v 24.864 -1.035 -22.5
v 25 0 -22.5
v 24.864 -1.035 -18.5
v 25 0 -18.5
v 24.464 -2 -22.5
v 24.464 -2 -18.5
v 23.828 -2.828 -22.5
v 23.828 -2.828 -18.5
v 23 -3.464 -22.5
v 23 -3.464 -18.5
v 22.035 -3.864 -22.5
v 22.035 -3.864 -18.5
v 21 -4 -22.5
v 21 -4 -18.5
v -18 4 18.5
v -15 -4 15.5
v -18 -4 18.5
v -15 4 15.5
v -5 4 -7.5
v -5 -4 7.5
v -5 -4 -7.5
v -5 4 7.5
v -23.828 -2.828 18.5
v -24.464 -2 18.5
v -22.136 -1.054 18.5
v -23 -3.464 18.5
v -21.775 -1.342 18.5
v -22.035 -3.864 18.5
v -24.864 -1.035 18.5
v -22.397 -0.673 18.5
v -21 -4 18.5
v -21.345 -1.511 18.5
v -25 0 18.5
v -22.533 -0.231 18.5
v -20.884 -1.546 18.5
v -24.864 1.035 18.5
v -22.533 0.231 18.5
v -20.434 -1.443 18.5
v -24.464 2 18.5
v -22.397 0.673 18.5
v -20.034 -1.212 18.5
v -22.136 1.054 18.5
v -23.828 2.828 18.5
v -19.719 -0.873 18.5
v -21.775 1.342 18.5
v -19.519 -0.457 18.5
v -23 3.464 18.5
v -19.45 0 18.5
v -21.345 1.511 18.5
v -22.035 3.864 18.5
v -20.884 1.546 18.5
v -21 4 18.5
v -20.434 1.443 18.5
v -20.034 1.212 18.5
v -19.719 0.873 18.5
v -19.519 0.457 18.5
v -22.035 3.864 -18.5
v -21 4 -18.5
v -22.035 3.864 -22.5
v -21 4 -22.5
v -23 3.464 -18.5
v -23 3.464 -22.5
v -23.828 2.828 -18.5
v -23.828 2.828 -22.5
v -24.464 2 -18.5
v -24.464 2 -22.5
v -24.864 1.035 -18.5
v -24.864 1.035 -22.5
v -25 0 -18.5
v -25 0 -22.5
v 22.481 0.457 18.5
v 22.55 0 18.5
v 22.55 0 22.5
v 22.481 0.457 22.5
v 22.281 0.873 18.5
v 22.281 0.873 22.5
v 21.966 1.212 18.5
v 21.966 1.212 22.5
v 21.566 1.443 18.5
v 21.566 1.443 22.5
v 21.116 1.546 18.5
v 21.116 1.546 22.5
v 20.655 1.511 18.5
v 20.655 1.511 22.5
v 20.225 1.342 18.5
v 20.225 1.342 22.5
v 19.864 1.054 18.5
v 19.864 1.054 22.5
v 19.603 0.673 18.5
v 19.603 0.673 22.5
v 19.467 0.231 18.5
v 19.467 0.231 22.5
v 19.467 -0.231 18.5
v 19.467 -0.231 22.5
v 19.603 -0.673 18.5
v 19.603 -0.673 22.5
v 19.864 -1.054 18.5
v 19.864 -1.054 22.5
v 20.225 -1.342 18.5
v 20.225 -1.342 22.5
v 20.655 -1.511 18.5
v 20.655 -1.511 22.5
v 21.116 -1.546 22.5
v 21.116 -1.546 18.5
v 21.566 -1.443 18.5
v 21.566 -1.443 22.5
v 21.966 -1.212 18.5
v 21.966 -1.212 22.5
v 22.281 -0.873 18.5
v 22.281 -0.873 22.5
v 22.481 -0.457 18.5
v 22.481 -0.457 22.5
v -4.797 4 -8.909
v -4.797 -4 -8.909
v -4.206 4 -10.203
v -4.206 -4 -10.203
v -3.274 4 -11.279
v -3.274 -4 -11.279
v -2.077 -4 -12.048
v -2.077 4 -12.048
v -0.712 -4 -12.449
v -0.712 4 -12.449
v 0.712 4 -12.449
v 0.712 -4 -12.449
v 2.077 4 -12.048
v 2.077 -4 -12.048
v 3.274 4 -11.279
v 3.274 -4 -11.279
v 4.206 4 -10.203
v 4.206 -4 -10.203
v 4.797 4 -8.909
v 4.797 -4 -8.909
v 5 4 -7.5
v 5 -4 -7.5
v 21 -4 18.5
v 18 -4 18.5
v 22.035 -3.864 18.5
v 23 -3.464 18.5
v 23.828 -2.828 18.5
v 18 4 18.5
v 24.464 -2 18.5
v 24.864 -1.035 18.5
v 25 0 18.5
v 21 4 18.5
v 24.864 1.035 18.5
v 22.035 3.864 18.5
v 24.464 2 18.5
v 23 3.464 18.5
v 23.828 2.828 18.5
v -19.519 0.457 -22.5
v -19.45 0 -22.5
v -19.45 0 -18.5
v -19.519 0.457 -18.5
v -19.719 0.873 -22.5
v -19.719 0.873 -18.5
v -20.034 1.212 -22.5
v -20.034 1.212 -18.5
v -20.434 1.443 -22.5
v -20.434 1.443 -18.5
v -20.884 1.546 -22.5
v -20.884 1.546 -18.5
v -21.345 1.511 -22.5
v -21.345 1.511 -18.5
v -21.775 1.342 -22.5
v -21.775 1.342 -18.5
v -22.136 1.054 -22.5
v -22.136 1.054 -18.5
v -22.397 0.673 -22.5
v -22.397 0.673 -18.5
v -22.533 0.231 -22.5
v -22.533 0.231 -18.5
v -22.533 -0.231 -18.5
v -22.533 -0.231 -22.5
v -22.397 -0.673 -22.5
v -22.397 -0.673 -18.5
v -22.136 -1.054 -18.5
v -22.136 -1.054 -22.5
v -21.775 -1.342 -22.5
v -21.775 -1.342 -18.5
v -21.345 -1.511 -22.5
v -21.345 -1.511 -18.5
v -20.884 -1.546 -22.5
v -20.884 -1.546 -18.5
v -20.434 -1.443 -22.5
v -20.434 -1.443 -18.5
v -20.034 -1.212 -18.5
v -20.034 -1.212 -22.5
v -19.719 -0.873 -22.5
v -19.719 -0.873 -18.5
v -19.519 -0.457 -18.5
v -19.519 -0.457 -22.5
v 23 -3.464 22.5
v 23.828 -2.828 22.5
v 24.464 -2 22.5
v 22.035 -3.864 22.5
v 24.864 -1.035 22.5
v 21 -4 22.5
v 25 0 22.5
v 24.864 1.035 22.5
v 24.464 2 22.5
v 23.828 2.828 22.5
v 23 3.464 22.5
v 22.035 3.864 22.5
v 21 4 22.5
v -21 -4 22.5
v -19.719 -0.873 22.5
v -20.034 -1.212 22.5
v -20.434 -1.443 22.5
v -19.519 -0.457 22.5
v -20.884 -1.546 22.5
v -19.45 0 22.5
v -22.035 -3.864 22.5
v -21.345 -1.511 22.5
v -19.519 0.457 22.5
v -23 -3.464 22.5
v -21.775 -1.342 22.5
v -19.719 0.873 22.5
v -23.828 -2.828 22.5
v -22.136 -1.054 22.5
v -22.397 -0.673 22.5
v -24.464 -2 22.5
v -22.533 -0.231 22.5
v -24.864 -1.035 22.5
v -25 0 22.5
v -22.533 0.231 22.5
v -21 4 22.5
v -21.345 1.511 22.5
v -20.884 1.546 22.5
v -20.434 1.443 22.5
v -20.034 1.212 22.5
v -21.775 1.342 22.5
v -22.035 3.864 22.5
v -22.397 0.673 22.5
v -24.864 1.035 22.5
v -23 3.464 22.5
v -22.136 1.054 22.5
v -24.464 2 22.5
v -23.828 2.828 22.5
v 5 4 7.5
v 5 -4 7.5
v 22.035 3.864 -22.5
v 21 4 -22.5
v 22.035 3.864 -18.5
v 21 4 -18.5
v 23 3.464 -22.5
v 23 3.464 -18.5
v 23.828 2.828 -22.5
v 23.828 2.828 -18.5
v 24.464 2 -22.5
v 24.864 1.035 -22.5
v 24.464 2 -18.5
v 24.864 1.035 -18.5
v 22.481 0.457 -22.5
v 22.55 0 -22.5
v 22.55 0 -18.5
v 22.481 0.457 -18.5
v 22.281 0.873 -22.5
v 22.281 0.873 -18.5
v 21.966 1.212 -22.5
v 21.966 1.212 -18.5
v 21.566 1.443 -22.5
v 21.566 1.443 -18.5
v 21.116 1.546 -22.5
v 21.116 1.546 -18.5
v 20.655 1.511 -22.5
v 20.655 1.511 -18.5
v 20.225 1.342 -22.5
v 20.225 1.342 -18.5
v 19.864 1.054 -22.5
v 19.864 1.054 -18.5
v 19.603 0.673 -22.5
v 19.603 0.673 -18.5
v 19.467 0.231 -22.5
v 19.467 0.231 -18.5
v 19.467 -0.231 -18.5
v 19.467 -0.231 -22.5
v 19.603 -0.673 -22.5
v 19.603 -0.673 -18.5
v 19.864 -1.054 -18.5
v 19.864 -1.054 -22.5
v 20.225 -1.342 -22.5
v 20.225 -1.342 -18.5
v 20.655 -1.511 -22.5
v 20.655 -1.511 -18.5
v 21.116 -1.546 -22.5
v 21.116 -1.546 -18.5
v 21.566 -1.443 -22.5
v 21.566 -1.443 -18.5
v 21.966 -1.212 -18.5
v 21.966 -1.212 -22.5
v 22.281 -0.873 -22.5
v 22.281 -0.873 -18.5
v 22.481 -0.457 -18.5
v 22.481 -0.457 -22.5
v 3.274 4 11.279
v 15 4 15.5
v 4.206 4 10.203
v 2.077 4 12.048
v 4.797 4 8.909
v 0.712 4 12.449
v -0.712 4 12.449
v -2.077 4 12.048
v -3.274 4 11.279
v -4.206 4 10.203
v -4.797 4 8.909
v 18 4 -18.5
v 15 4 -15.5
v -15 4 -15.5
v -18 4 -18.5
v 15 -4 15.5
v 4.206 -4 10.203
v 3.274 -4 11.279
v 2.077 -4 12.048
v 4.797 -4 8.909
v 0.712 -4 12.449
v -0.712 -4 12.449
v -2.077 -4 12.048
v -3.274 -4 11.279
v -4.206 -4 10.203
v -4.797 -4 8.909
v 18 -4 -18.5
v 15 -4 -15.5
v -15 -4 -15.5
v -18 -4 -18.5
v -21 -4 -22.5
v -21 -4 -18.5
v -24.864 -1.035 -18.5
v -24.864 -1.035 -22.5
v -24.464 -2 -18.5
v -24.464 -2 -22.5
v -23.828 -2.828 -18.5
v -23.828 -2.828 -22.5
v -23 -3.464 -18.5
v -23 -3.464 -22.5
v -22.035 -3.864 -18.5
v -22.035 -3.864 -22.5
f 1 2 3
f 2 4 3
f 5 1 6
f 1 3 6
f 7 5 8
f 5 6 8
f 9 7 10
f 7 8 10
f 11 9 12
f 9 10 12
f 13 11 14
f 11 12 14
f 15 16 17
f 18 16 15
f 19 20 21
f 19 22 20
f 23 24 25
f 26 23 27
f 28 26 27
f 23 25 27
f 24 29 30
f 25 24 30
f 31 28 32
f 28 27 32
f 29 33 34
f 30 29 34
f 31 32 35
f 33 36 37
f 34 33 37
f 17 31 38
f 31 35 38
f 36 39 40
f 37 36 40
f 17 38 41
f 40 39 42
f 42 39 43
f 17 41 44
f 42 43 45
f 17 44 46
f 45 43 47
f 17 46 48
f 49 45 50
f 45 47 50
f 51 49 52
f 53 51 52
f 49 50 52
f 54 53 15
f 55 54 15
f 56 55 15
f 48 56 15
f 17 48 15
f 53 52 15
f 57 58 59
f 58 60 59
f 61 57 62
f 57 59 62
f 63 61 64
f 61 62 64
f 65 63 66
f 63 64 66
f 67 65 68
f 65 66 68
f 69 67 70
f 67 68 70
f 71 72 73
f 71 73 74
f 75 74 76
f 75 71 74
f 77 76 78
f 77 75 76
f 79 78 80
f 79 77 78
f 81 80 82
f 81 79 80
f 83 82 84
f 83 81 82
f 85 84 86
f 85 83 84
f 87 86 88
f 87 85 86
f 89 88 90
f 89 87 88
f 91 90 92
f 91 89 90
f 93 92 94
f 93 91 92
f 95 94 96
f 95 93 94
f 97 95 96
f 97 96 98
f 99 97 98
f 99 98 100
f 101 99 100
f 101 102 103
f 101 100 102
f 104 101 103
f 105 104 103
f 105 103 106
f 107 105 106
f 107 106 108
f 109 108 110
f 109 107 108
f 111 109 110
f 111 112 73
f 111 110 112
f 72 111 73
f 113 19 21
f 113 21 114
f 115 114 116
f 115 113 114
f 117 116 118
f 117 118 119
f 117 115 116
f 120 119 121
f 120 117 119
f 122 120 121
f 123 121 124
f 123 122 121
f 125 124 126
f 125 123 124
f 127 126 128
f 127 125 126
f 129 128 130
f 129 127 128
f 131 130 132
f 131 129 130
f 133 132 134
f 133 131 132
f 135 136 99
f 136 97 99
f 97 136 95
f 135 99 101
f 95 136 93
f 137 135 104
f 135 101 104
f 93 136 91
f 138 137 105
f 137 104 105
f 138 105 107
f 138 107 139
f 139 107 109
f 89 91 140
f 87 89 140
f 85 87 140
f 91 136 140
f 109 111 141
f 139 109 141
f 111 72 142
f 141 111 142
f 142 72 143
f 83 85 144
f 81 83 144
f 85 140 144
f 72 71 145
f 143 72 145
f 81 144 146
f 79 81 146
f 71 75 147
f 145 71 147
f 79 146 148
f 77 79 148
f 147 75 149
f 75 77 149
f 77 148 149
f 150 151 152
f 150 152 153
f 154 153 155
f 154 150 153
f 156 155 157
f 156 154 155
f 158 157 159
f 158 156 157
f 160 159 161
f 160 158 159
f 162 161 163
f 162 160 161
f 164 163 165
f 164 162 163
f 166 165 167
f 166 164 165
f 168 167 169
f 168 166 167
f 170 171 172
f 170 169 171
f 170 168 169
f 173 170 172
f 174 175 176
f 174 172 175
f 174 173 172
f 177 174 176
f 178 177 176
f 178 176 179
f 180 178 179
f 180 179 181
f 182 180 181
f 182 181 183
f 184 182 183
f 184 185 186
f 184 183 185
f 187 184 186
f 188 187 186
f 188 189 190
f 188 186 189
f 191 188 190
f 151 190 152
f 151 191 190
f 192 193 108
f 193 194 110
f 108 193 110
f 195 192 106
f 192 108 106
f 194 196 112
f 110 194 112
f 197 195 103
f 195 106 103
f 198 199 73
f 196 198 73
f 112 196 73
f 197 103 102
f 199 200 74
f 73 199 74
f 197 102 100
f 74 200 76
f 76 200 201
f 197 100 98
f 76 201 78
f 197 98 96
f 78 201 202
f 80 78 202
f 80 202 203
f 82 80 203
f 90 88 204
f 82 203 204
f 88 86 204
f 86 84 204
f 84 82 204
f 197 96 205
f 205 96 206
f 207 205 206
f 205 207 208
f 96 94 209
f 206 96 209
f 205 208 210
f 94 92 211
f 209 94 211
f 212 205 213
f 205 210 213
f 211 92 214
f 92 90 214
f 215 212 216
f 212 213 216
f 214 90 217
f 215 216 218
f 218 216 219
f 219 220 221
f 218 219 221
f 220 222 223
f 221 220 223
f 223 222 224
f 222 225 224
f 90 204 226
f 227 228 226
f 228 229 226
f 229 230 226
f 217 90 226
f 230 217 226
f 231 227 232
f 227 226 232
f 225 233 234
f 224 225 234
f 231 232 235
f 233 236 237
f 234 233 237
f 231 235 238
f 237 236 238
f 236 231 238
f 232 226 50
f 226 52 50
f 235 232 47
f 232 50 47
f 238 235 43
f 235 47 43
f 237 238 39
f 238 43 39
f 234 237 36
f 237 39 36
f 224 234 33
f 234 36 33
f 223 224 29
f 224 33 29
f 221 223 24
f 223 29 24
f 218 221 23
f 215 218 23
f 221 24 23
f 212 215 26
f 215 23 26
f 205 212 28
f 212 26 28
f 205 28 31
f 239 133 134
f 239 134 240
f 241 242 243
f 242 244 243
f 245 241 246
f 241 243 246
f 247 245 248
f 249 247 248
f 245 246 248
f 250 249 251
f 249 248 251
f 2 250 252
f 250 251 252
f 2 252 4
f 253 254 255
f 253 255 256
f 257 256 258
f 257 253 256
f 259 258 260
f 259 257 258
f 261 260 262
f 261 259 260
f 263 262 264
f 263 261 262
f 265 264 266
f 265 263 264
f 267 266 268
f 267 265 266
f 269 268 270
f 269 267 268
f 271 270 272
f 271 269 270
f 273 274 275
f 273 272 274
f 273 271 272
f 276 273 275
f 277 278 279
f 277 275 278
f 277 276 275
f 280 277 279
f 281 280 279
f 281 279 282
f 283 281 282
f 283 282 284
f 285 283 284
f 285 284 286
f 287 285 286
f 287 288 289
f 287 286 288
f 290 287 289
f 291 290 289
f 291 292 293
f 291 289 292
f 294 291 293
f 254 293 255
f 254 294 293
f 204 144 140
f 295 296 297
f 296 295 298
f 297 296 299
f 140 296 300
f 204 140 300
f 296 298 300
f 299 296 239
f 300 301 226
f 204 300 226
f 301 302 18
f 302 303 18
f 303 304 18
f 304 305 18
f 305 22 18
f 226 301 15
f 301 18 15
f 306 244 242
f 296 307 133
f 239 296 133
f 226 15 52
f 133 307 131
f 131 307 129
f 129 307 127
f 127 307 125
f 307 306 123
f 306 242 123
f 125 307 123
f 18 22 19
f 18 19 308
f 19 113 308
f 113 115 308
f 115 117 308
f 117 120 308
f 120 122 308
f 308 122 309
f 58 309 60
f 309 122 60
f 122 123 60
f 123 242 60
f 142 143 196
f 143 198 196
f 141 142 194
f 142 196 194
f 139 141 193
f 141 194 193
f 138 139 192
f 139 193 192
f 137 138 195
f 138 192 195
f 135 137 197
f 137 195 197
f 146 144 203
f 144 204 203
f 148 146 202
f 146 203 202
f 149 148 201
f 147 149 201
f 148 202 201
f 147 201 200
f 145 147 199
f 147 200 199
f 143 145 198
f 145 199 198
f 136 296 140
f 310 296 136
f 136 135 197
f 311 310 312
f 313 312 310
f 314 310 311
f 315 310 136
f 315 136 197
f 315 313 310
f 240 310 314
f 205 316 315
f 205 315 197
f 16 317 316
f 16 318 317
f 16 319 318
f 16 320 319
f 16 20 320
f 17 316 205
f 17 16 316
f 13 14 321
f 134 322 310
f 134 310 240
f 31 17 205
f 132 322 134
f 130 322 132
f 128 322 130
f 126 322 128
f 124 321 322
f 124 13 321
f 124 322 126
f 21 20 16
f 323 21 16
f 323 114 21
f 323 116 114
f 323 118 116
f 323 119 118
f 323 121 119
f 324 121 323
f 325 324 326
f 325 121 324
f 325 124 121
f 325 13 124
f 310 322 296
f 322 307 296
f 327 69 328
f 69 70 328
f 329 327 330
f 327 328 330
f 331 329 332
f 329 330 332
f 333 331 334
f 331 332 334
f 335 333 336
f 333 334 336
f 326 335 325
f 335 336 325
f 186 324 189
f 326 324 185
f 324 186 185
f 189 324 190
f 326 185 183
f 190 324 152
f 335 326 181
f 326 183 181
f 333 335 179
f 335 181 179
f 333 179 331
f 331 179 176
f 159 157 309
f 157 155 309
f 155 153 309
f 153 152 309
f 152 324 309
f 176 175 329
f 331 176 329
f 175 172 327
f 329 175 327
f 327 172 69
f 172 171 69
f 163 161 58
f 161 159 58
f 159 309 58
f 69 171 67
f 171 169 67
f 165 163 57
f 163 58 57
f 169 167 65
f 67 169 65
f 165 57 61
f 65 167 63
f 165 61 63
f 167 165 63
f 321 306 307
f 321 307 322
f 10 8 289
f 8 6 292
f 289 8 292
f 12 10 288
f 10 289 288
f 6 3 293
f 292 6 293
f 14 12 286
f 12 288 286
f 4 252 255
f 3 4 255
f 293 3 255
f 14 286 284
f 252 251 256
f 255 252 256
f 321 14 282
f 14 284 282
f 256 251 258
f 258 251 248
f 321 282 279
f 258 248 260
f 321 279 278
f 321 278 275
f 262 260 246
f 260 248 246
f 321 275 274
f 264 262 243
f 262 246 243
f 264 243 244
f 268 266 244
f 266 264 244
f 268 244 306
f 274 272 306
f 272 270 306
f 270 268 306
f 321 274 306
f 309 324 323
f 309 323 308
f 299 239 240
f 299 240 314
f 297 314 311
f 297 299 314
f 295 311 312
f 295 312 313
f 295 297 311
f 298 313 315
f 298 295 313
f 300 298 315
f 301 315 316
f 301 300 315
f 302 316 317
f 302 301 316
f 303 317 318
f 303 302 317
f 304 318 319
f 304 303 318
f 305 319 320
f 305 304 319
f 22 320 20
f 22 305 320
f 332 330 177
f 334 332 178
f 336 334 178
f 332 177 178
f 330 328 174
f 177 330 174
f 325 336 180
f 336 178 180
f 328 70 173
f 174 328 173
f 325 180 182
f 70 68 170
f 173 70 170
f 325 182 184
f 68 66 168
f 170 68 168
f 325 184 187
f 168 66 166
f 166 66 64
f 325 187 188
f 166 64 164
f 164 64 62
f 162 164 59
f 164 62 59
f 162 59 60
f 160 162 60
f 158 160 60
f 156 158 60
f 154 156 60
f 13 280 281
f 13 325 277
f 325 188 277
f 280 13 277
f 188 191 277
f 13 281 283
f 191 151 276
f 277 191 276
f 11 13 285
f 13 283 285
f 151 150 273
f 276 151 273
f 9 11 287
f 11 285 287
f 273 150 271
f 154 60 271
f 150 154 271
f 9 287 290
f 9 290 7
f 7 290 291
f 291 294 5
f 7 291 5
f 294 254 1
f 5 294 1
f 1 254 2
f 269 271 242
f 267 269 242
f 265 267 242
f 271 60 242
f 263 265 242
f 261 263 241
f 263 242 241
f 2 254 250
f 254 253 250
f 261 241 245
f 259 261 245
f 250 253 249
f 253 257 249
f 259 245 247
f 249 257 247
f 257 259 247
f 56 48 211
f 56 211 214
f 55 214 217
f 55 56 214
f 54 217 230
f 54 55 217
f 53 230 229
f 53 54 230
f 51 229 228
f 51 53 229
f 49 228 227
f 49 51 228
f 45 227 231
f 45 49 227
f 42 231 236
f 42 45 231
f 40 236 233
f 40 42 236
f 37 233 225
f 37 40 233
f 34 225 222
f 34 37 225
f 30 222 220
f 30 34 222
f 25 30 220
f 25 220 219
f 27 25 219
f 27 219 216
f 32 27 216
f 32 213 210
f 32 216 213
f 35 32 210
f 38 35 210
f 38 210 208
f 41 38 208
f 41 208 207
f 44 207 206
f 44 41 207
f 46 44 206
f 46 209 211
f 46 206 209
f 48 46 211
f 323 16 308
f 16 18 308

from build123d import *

# Parameters (mm, degrees)
BOSS_EXTRUDE1_DEPTH     = 4
CHAMFER1_SIZE           = 3
CUT_EXTRUDE1_DEPTH      = 34.871079109
CUT_EXTRUDE1_DEPTH_BACK = 34.871079109
SKETCH3_R               = 1.55
FILLET1_R               = 4


with BuildPart() as part:
    # Sketch1 → Boss-Extrude1 (new, symmetric)
    with BuildSketch(Plane(origin=(0, 0, 0), x_dir=(1, 0, 0), z_dir=(0, 1, 0))):
        Polygon((-25, 22.5), (25, 22.5), (25, 18.5), (15, 18.5), (15, -18.5), (25, -18.5), (25, -22.5), (-25, -22.5), (-25, -18.5), (-15, -18.5), (-15, 18.5), (-25, 18.5), align=None)
        with BuildLine():
            Line((-5, -7.5), (-5, 7.5))
            ThreePointArc((-5, 7.5), (0, 12.5), (5, 7.5))
            Line((5, 7.5), (5, -7.5))
            ThreePointArc((5, -7.5), (0, -12.5), (-5, -7.5))
        make_face(mode=Mode.SUBTRACT)
    extrude(amount=BOSS_EXTRUDE1_DEPTH, both=True)

    # Chamfer1
    chamfer1_edges = [part.edges().sort_by_distance(p)[0] for p in [
        (-15, 0, 18.5),
        (-15, 0, -18.5),
        (15, 0, -18.5),
        (15, 0, 18.5),
    ]]
    chamfer(chamfer1_edges, length=CHAMFER1_SIZE)

    # Sketch3 → Cut-Extrude1 (cut, two sides: drawn at the far end of the back side and taken through both)
    with BuildSketch(Plane.XY.offset(-CUT_EXTRUDE1_DEPTH_BACK)):
        with Locations((-21, 0)):
            Circle(SKETCH3_R)
        with Locations((21, 0)):
            Circle(SKETCH3_R)
    extrude(amount=CUT_EXTRUDE1_DEPTH + CUT_EXTRUDE1_DEPTH_BACK, mode=Mode.SUBTRACT)

    # Fillet1
    fillet1_edges = [part.edges().sort_by_distance(p)[0] for p in [
        (25, -4, 20.5),
        (-25, -4, 20.5),
        (-25, 4, 20.5),
        (25, 4, 20.5),
        (25, -4, -20.5),
        (25, 4, -20.5),
        (-25, -4, -20.5),
        (-25, 4, -20.5),
    ]]
    fillet(fillet1_edges, radius=FILLET1_R - 0.0001)  # a hair under: the kernel refuses the full size


solid = part.part
